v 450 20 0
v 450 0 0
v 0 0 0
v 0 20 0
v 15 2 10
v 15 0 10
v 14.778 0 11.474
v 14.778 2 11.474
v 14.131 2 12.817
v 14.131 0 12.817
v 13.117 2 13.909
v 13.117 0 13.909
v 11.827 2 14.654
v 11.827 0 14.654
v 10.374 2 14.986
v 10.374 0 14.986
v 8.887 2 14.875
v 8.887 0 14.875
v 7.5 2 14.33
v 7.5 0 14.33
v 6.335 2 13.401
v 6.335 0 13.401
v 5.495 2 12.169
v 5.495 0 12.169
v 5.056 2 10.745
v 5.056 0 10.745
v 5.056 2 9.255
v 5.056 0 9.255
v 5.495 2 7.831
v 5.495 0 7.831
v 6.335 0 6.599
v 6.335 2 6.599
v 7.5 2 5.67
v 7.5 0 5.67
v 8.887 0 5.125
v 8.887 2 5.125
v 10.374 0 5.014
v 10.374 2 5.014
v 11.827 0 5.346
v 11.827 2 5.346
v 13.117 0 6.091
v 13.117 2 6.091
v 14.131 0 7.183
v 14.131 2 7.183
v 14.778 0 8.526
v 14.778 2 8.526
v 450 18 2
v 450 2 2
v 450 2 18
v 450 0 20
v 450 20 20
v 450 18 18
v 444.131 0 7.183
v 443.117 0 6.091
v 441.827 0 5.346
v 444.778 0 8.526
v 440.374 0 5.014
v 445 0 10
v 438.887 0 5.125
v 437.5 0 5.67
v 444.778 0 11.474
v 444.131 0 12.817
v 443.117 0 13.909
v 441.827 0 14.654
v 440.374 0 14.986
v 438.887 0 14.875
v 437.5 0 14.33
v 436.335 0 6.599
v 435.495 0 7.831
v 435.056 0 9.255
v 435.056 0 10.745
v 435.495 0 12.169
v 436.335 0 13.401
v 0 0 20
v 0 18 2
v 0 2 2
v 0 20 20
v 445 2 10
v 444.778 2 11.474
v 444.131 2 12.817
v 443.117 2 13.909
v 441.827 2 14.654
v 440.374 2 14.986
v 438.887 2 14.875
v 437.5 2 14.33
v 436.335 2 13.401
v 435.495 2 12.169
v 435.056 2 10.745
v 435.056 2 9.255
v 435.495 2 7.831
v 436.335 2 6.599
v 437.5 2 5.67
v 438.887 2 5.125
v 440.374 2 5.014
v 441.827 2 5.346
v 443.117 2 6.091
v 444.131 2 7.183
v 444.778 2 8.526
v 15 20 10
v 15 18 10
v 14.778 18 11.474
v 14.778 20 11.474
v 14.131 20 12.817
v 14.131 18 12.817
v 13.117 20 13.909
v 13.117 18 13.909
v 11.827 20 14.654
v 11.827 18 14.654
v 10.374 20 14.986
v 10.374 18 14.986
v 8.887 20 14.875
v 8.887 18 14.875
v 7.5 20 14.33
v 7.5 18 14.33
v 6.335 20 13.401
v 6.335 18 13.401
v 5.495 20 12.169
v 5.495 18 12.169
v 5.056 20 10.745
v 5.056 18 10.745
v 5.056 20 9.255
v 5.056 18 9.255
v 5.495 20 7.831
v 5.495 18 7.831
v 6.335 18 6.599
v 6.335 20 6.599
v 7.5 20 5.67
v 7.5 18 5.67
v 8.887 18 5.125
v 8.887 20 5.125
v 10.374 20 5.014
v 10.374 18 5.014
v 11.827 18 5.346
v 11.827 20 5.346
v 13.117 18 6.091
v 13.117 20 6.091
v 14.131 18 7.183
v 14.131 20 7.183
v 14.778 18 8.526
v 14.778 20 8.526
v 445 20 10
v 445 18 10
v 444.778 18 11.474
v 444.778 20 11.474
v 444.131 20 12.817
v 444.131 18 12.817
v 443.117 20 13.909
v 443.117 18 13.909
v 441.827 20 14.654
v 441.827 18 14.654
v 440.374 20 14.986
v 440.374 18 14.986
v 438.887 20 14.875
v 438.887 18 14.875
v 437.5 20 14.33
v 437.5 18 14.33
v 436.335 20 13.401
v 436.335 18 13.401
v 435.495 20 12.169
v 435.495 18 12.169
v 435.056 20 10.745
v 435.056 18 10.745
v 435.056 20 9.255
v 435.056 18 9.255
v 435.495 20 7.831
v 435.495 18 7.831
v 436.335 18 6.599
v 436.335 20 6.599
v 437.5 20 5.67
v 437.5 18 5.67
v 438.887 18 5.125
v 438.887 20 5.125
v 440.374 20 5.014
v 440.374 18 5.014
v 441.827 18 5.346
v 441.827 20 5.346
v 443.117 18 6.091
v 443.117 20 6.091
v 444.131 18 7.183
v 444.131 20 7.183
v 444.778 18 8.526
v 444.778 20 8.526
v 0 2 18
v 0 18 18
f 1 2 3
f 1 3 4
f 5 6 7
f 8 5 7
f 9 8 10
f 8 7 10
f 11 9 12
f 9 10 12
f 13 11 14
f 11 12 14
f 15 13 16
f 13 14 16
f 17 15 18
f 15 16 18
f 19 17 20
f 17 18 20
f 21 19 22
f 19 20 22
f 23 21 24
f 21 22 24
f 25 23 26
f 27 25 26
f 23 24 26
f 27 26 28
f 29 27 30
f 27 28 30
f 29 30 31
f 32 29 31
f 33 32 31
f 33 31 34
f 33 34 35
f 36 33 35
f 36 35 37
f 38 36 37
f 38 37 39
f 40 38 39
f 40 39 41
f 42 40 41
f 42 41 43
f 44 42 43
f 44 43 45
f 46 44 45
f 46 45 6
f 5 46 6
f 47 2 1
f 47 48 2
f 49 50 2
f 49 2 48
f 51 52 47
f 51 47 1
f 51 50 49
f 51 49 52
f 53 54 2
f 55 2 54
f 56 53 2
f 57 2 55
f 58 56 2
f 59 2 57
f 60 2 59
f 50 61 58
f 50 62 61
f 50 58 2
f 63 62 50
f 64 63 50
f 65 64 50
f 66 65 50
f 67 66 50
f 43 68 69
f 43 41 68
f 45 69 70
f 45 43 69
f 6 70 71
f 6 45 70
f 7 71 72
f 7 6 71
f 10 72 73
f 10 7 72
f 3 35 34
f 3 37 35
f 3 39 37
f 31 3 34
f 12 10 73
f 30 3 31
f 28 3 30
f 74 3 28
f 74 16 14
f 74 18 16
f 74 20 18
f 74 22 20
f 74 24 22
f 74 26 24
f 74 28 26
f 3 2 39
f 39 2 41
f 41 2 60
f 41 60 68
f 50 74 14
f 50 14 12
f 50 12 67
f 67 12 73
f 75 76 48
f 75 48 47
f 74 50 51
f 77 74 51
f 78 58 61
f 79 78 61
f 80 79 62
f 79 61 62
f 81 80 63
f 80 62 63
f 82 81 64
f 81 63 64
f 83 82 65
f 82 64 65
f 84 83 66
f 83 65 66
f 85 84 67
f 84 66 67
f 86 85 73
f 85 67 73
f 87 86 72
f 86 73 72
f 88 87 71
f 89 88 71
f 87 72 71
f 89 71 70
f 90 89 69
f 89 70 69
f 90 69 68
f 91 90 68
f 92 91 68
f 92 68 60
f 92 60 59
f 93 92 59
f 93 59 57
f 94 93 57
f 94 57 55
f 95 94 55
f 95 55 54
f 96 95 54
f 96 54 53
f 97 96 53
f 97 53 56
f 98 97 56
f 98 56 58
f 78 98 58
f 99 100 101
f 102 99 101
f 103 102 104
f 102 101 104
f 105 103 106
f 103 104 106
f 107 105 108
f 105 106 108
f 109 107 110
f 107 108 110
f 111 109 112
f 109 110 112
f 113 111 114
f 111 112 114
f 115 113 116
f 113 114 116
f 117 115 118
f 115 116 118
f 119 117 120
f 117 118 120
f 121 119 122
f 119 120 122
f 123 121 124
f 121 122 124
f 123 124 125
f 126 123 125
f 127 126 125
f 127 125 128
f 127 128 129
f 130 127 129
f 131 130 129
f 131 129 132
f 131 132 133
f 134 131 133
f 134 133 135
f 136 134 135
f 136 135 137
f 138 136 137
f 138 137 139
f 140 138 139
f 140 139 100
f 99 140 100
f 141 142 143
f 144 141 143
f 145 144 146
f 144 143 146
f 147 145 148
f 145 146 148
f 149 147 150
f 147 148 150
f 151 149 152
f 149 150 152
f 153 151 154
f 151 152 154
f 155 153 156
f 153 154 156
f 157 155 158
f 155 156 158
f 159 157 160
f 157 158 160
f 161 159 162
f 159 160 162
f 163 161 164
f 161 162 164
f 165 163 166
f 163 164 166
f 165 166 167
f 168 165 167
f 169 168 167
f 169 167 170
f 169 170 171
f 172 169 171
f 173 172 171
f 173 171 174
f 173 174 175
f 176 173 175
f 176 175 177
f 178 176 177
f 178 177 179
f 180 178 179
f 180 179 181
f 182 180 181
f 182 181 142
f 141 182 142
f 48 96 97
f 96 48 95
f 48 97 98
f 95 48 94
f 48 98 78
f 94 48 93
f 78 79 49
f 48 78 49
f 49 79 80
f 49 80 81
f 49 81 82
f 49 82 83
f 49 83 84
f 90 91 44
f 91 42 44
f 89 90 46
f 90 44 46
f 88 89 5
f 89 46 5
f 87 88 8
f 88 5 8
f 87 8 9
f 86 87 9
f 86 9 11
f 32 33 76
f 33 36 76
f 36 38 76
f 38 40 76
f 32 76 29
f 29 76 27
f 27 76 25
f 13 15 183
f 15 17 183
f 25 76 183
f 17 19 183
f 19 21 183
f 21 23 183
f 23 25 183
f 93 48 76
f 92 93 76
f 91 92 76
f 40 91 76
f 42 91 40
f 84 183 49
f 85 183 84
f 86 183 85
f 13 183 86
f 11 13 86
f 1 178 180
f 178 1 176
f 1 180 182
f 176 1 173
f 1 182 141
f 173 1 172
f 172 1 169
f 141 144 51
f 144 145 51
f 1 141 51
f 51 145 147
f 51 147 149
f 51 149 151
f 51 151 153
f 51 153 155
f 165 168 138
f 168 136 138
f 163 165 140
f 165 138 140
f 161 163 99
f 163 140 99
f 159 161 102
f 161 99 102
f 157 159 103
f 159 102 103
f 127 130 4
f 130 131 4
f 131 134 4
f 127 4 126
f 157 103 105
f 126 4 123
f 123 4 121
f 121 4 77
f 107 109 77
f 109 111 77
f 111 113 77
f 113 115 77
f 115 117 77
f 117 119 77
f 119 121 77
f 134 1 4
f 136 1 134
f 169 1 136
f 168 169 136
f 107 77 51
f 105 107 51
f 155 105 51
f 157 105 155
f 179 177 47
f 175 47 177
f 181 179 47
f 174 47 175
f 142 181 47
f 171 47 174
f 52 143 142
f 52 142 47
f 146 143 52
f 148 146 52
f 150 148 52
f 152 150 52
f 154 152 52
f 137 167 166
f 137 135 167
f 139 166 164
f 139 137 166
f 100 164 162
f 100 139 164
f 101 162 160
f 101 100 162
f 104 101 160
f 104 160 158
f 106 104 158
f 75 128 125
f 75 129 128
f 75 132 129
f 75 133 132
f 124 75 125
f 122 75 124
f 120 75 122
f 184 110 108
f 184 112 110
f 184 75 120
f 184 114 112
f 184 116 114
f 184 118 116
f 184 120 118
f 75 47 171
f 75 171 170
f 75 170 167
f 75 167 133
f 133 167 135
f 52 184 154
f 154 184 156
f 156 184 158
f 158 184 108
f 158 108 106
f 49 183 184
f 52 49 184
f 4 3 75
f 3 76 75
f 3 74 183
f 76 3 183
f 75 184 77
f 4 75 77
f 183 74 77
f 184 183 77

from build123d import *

# Parameters (mm, degrees)
F0_W     = 20
F0_H     = 20
F0_W_2   = 16
F0_H_2   = 16
F1_DEPTH = 450
F2_R     = 5
F3_DEPTH = 20.001
F4_R     = 5
F5_DEPTH = 20.001


with BuildPart() as f1:
    # F0 (on Right) → F1 (new body)
    with BuildSketch(Plane.YZ):
        with Locations((10, 10)):
            Rectangle(F0_W, F0_H)
        with Locations((10, 10)):
            Rectangle(F0_W_2, F0_H_2, mode=Mode.SUBTRACT)
    extrude(amount=F1_DEPTH)

    # F2 (on face) → F3 (cut, through all)
    with BuildSketch(Plane.XZ):
        with Locations((440, 10)):
            Circle(F2_R)
    extrude(amount=-F3_DEPTH, mode=Mode.SUBTRACT)

    # F4 (on face) → F5 (cut, through all)
    with BuildSketch(Plane.XZ):
        with Locations((10, 10)):
            Circle(F4_R)
    extrude(amount=-F5_DEPTH, mode=Mode.SUBTRACT)


solid = f1.part
